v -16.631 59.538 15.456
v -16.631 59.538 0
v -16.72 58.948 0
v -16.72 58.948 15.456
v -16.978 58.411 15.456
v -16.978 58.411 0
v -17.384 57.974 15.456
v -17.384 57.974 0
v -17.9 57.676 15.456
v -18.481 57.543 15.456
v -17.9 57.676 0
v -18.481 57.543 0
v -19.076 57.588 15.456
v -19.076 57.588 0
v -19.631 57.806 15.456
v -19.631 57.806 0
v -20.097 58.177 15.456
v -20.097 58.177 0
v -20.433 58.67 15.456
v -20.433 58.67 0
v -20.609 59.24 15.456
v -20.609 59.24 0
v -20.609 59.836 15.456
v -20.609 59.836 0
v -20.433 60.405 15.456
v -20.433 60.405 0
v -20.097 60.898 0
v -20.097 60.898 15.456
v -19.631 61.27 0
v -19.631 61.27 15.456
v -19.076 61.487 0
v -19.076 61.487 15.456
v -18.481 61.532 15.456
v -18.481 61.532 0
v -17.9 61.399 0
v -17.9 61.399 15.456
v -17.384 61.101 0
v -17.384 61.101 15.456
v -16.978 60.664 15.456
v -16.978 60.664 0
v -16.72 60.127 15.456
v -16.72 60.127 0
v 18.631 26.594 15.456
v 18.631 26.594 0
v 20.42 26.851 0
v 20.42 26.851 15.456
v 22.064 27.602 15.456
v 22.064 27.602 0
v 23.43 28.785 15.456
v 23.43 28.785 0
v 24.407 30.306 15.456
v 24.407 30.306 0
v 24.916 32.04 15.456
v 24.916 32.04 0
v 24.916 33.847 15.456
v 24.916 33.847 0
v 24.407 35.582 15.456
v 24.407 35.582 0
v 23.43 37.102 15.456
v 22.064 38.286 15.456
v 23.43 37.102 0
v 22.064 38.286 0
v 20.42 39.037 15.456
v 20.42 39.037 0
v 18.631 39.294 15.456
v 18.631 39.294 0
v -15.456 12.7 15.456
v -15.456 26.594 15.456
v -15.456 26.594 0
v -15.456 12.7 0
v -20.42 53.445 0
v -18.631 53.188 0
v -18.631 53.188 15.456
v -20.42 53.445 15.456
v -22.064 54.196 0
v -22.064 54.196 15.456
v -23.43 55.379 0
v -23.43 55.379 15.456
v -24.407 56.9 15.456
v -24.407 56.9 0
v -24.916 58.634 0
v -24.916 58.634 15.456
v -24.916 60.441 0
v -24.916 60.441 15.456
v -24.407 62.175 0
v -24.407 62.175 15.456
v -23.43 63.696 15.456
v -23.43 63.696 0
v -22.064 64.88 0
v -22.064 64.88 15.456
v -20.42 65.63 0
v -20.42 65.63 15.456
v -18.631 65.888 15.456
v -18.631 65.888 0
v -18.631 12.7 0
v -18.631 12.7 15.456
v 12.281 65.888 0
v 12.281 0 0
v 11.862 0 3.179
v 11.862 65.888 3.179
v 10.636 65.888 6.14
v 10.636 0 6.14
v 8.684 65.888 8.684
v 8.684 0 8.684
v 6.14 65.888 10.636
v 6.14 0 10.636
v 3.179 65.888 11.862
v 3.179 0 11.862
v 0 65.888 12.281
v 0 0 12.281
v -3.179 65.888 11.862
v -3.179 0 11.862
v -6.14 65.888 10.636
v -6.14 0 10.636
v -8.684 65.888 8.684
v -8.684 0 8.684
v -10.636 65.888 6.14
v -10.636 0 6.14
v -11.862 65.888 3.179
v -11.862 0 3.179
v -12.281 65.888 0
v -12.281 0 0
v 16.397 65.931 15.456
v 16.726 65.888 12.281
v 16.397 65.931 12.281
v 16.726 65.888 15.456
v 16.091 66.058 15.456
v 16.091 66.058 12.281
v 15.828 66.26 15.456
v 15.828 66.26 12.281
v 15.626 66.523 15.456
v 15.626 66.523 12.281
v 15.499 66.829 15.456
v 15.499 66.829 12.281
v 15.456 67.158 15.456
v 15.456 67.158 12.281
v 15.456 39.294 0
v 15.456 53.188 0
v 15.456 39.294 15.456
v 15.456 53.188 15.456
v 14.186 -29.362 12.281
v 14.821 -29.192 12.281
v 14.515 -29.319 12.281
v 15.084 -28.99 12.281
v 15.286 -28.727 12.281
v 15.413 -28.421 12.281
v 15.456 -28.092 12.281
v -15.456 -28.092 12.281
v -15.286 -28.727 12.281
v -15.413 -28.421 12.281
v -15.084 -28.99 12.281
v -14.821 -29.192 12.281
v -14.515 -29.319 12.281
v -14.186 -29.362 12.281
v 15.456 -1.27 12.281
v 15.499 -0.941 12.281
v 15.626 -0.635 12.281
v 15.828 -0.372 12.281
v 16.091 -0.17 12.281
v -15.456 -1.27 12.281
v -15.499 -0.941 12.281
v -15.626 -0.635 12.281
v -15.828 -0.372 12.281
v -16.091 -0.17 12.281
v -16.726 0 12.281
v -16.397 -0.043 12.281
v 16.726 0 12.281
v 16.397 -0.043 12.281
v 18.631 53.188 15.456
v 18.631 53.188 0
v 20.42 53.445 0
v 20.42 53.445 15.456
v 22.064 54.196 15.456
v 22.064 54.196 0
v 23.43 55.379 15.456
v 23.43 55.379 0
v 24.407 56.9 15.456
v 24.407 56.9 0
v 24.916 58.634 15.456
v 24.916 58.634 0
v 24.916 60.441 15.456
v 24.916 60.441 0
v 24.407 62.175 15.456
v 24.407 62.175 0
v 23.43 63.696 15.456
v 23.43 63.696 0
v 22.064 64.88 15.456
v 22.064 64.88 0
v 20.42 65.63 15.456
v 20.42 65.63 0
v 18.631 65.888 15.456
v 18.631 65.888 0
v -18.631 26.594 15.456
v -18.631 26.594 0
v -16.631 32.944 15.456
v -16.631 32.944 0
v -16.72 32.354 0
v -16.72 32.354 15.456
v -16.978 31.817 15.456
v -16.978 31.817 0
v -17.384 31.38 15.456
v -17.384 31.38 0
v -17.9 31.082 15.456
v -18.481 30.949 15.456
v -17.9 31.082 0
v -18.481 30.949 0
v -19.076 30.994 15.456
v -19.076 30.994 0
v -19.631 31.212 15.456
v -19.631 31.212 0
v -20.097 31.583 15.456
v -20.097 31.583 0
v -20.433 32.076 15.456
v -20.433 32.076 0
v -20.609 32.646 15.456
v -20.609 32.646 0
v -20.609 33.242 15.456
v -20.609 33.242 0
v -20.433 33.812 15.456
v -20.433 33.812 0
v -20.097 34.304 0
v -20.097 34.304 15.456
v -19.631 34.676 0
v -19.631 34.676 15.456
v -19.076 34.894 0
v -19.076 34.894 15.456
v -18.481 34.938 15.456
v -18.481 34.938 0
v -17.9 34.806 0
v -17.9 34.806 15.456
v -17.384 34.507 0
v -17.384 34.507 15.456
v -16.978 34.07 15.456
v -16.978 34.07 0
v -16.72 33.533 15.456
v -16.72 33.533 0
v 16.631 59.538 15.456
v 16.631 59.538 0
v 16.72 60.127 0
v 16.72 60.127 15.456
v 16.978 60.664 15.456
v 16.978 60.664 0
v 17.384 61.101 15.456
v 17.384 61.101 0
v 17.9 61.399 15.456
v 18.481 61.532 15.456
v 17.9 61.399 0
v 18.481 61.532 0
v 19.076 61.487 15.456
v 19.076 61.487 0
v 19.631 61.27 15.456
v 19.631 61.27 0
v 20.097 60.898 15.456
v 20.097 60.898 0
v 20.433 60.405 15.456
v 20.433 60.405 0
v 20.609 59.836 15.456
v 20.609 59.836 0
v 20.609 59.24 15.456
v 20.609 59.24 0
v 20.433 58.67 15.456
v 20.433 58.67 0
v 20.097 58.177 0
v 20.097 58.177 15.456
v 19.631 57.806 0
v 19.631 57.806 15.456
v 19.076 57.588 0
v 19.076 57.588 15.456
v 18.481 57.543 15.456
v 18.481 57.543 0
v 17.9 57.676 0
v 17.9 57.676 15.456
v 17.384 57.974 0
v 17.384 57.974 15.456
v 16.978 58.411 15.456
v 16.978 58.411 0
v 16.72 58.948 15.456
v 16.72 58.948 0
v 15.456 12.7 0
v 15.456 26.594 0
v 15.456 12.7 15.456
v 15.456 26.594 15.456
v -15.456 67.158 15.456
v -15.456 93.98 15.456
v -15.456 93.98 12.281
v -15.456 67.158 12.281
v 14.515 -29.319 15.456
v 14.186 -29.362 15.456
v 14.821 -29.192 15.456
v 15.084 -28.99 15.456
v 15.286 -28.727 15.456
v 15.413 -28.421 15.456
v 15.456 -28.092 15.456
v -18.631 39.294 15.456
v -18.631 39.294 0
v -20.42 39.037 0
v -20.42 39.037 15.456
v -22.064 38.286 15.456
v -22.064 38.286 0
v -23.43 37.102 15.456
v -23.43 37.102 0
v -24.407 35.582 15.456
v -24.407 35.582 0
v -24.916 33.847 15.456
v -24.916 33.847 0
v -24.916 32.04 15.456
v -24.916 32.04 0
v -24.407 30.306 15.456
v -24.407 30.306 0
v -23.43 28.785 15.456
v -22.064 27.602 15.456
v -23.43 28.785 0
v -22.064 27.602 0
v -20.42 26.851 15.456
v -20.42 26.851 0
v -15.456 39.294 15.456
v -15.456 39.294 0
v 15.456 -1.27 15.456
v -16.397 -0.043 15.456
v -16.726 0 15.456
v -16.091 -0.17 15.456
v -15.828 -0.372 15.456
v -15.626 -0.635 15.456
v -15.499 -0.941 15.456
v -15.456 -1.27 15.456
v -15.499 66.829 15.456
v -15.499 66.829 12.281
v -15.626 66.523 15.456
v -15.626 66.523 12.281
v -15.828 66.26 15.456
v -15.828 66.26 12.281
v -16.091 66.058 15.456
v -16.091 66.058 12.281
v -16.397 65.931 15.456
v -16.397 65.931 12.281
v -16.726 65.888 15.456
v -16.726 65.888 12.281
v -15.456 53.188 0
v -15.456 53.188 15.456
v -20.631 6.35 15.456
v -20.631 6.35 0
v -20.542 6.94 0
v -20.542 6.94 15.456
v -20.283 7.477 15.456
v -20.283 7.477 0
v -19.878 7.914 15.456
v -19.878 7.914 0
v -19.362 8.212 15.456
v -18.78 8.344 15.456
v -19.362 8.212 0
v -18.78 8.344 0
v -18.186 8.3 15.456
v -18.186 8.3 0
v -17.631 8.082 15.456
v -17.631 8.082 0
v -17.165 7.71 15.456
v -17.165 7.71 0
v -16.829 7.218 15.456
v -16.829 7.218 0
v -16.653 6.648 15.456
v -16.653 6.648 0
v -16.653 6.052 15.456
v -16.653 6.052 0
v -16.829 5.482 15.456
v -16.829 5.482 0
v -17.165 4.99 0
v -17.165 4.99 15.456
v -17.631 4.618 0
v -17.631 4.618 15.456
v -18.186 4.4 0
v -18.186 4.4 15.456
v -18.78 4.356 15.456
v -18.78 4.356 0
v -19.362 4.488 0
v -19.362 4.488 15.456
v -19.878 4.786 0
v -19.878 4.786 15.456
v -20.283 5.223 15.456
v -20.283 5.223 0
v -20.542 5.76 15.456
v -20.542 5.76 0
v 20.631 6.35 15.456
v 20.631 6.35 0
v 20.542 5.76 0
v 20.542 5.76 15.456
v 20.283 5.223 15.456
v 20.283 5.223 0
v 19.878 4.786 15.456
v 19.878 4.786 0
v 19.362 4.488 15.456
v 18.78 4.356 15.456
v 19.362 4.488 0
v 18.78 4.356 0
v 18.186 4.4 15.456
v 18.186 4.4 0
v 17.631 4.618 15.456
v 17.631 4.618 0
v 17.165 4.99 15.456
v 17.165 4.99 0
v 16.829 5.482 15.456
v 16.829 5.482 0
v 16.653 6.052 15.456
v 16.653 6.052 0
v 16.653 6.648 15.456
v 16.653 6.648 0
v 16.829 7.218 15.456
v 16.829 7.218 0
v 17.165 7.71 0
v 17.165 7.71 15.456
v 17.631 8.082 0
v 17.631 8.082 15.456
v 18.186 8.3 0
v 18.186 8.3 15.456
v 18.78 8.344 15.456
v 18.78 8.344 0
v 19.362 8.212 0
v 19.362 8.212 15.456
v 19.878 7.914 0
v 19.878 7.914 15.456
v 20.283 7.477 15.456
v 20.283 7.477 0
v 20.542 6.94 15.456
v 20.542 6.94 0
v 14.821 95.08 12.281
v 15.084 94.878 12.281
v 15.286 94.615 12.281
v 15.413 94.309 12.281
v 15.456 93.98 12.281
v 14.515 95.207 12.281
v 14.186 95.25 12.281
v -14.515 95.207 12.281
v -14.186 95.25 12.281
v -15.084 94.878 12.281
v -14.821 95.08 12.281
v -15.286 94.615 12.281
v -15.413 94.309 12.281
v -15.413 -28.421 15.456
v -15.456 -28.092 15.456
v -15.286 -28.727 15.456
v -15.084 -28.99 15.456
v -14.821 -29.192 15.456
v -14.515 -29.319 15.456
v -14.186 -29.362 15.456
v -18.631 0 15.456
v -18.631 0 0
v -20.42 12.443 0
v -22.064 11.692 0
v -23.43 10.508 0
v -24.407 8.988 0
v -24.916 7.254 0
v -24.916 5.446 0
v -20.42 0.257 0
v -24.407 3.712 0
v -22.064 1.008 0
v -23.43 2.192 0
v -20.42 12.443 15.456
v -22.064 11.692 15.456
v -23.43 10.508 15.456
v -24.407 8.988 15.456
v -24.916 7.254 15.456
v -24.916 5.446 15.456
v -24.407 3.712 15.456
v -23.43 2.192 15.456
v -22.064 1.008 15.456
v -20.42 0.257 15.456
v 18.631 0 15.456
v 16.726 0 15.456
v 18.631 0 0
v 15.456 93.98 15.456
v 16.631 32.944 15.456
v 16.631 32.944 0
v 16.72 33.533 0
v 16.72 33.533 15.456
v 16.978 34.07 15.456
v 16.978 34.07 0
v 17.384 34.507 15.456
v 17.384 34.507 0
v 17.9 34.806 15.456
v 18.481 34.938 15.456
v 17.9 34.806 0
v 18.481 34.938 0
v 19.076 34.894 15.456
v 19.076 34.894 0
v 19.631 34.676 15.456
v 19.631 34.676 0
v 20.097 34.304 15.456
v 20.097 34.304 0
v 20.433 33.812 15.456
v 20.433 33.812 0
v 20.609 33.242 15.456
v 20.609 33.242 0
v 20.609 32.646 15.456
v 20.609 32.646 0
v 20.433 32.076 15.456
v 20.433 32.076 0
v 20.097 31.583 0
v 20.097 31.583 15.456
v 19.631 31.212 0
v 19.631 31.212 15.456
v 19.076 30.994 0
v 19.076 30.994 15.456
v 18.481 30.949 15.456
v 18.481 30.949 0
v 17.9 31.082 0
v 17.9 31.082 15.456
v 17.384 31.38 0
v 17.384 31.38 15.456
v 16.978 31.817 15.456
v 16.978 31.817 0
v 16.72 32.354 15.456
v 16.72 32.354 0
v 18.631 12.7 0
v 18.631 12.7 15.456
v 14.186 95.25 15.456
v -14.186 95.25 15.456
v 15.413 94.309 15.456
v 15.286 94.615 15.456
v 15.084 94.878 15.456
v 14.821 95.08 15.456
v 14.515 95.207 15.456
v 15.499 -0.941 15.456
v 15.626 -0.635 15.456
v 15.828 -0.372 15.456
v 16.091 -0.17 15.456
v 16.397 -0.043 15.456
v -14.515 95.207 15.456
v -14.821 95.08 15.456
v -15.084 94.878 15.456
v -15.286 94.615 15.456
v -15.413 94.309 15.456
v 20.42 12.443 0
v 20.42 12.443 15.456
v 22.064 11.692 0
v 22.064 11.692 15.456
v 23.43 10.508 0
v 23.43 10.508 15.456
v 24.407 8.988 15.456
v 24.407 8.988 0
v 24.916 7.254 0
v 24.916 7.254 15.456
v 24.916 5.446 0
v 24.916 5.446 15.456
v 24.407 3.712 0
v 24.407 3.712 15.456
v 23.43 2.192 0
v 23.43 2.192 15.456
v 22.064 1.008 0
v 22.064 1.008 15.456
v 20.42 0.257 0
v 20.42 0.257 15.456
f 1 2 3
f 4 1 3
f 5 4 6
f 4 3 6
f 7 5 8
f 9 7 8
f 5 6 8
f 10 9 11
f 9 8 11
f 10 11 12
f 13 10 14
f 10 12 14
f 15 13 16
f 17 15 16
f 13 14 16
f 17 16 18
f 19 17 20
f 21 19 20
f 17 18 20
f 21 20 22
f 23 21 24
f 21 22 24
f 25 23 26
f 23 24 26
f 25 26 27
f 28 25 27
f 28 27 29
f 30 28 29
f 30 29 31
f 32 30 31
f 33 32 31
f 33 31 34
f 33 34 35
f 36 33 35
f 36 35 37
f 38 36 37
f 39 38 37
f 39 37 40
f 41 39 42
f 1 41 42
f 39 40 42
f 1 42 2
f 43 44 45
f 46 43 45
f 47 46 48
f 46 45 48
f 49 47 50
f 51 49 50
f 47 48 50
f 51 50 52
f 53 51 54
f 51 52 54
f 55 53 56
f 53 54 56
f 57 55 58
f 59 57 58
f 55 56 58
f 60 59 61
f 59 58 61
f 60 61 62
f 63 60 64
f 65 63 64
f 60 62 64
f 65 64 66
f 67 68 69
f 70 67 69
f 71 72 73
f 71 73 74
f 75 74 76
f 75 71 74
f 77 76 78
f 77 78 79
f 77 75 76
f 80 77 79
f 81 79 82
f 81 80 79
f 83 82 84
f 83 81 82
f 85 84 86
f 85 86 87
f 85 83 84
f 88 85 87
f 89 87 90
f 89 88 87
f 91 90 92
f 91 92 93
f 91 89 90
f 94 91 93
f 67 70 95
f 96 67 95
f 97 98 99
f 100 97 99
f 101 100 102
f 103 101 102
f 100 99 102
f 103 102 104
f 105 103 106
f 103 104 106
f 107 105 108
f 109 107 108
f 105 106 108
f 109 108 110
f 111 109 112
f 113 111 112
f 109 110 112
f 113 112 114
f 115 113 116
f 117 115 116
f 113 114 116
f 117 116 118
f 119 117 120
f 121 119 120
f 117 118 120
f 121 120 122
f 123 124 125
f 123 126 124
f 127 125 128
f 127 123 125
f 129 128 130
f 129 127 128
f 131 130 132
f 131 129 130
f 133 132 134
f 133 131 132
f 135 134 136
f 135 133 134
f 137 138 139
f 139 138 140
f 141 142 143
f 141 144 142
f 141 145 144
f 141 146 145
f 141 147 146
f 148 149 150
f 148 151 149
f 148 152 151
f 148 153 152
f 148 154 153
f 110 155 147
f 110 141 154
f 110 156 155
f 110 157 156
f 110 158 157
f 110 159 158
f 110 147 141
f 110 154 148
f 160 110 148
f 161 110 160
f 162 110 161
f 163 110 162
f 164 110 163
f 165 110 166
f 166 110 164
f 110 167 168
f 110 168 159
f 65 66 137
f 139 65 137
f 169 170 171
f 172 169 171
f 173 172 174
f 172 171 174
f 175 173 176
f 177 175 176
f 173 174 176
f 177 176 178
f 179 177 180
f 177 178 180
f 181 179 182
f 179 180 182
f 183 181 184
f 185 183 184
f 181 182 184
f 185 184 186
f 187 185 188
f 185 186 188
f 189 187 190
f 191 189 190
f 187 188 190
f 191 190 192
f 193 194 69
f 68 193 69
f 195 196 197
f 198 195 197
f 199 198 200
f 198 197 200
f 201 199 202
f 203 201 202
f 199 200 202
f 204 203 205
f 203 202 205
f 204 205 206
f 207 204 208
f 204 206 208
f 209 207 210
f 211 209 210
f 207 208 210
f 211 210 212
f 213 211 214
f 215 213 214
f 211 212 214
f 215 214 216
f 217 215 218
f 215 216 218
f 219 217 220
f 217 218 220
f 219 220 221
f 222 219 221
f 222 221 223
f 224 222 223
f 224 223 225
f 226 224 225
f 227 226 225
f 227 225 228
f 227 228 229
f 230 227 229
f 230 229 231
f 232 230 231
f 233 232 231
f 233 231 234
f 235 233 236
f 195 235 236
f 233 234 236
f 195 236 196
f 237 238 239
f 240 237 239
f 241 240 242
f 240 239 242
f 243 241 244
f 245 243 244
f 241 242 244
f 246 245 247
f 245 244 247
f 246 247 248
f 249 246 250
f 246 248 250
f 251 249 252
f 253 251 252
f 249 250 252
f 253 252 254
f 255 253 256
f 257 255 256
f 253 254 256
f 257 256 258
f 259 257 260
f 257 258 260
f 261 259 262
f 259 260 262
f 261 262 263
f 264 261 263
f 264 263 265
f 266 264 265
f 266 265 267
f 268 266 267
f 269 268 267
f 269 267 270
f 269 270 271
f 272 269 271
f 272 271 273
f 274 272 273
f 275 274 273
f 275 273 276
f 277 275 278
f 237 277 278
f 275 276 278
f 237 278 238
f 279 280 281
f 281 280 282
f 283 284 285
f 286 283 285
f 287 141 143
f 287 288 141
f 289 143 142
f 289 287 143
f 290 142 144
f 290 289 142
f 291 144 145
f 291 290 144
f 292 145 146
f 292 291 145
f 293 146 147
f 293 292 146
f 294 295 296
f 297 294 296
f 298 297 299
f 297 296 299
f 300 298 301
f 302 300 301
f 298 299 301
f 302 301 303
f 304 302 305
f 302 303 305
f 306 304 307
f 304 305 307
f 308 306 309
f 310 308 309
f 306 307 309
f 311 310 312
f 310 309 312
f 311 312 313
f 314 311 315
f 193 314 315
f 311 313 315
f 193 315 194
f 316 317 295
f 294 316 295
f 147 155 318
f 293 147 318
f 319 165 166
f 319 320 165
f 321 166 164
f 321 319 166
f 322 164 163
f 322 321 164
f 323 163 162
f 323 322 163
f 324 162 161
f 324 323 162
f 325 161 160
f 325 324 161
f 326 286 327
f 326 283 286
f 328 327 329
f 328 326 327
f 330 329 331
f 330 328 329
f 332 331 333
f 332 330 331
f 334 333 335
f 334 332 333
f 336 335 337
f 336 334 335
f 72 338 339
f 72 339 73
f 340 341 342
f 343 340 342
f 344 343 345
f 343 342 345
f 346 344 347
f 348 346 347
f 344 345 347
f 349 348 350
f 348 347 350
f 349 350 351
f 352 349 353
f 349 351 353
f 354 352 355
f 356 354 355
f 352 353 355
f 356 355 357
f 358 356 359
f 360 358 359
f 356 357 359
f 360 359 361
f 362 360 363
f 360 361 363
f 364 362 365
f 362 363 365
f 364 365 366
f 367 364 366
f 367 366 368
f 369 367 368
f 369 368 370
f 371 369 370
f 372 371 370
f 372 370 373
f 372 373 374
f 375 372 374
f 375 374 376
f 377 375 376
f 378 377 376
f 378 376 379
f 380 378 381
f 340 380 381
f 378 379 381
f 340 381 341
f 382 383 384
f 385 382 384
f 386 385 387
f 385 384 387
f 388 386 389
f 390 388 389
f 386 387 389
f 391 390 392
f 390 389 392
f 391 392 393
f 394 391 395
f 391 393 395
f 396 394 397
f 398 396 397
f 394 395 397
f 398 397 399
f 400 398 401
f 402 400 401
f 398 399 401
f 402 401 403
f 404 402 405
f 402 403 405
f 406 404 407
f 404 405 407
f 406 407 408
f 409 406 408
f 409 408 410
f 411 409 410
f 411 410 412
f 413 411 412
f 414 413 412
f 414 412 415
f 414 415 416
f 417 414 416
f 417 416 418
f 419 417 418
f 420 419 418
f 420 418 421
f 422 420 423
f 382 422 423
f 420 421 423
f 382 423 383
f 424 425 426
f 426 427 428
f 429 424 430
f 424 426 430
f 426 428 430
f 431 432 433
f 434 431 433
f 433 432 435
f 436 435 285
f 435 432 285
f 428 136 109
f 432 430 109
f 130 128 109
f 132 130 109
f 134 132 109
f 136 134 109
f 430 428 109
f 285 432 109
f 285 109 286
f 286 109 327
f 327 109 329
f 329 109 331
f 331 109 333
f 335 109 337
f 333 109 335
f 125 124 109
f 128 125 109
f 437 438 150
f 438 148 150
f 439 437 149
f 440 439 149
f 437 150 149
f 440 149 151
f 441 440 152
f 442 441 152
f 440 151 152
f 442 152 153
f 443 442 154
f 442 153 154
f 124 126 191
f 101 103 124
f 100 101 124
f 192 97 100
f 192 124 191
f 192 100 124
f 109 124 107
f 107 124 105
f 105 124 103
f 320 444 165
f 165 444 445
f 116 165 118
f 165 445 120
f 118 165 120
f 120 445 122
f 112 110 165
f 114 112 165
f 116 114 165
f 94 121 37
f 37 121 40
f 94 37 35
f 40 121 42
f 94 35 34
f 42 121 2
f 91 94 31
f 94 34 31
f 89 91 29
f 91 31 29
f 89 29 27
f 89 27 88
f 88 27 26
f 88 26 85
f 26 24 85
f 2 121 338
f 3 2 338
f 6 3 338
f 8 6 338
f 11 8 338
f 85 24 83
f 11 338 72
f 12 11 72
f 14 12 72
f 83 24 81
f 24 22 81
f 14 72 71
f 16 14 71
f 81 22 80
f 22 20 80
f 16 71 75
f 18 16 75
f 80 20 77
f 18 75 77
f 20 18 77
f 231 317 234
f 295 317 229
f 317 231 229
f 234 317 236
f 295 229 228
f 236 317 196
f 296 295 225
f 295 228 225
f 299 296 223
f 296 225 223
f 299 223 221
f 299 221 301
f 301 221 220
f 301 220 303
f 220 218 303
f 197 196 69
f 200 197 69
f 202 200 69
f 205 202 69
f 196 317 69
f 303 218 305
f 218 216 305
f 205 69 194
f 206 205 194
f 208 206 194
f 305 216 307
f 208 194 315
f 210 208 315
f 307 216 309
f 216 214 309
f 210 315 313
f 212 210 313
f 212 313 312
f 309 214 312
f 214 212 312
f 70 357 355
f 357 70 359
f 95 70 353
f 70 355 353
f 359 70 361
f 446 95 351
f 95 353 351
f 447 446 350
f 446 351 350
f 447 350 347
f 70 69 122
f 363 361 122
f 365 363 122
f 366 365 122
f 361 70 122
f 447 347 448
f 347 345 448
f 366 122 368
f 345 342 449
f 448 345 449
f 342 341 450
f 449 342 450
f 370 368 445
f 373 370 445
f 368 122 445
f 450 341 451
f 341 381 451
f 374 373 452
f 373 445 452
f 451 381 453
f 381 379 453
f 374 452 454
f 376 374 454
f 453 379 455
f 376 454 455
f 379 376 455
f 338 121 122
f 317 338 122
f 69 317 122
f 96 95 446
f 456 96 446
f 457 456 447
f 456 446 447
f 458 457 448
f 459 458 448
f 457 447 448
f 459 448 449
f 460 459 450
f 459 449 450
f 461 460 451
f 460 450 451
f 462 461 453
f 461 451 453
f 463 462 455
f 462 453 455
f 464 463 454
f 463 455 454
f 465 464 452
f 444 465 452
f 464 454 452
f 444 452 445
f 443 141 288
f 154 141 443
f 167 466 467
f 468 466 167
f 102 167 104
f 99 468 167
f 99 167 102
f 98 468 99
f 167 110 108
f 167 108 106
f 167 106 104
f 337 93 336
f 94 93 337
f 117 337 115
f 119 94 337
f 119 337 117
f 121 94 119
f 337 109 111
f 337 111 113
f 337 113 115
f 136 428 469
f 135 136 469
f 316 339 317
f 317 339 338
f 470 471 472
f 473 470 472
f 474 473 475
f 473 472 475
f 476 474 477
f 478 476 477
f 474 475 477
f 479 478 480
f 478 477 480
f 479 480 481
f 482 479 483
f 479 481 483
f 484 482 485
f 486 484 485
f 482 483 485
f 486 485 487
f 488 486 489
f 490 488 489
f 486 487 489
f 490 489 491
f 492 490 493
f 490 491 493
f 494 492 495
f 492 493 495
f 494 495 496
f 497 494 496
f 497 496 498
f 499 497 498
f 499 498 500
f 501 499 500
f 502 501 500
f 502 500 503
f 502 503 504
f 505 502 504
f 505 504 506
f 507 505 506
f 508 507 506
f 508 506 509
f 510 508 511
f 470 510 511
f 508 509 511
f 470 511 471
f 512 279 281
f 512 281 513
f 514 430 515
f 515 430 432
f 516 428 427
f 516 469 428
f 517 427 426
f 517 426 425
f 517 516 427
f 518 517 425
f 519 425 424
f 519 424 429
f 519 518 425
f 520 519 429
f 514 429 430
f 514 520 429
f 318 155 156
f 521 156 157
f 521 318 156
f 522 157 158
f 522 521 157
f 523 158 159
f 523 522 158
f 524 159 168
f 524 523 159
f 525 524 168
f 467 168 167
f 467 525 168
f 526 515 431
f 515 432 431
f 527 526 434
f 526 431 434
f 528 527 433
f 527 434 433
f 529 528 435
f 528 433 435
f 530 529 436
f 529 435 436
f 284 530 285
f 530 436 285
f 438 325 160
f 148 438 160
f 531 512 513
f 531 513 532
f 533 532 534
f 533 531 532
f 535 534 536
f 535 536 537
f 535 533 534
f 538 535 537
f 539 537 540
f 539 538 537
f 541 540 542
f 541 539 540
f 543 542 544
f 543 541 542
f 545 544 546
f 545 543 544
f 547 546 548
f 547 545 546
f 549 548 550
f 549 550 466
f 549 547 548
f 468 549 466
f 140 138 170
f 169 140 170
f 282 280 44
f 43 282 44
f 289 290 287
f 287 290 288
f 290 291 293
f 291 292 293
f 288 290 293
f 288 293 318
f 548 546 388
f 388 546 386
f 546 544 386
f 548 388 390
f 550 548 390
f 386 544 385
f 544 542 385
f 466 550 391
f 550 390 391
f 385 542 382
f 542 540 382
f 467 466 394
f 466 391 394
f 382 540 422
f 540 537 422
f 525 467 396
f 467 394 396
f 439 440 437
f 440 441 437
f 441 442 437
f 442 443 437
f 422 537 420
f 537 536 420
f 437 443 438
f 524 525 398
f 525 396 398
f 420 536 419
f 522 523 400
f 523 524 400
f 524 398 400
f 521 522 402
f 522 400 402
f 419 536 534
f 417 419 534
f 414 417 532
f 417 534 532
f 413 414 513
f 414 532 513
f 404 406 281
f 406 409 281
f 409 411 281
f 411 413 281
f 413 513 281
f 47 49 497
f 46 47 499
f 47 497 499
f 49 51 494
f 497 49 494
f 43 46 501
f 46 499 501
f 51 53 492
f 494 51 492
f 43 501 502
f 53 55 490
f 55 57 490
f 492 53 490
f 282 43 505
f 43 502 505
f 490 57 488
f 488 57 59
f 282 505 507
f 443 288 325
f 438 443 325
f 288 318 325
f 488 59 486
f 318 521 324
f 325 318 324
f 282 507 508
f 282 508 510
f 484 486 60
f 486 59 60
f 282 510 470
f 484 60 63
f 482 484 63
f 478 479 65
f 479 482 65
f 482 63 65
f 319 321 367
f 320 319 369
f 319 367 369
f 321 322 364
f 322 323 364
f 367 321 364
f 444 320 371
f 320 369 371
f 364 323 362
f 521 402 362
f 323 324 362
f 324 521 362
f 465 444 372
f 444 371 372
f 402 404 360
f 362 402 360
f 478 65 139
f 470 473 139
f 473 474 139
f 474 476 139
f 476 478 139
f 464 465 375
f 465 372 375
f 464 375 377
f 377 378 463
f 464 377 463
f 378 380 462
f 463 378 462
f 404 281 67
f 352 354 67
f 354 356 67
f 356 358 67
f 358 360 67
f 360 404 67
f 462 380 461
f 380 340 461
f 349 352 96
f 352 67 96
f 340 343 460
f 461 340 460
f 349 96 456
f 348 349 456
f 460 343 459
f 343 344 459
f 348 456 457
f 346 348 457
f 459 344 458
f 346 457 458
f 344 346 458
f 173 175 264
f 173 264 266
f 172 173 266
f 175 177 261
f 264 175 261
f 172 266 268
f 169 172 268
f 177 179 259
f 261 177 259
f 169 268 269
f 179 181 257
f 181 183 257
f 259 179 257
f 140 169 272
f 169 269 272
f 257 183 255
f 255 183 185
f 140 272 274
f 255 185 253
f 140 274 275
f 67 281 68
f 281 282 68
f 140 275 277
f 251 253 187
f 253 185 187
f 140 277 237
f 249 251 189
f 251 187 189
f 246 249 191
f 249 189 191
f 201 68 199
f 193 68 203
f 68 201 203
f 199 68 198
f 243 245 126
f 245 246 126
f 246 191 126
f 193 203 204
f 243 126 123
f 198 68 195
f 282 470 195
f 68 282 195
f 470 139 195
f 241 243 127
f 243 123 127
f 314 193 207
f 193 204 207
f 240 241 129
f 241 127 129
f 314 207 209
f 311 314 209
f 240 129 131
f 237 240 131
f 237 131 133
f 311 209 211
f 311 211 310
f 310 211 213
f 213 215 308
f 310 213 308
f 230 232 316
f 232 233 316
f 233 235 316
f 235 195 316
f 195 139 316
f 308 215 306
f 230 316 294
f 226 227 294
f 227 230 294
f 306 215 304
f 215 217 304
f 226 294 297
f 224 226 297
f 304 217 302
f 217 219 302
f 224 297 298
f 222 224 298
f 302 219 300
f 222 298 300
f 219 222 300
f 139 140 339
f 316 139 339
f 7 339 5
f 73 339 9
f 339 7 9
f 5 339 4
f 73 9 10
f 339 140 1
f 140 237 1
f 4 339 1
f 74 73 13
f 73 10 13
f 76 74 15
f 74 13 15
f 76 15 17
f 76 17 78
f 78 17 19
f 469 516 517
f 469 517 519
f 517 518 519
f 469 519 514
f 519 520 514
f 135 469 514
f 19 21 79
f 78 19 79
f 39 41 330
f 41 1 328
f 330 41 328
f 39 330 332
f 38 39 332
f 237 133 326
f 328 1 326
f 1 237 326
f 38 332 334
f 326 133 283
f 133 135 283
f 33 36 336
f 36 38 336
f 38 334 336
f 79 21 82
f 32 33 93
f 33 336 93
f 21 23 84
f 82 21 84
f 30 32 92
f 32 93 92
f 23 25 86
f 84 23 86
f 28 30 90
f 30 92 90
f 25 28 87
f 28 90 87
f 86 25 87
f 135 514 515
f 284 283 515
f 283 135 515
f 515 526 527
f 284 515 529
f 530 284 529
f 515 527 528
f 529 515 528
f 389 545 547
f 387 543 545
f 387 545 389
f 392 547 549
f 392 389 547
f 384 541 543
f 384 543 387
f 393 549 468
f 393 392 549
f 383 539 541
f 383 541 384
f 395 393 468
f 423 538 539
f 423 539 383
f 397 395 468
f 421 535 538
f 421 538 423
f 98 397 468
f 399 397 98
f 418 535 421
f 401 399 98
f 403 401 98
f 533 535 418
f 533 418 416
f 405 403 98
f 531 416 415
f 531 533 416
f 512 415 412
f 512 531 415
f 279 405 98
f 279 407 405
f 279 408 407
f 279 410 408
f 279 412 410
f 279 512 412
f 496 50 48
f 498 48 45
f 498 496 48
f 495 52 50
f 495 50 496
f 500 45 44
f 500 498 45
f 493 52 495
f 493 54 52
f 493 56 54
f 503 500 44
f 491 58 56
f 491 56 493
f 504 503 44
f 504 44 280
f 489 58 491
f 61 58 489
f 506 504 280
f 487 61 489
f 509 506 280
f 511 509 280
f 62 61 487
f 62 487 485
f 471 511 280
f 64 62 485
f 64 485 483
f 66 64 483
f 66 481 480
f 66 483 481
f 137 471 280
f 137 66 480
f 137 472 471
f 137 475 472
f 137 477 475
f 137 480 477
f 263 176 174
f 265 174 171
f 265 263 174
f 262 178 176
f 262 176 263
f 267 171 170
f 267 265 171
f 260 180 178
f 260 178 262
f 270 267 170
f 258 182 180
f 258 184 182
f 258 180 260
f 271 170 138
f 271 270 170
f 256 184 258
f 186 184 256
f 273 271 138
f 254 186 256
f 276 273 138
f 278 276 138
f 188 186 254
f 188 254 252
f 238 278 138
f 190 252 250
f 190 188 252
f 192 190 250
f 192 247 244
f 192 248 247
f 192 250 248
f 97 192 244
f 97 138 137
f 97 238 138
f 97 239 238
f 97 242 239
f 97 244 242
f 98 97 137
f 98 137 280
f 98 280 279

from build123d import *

# Parameters (mm, degrees)
BOSS_EXTRUDE1_DEPTH = 65.8876
BOSS_EXTRUDE2_DEPTH = 29.3624
SKETCH4_R           = 2
BOSS_EXTRUDE3_DEPTH = 15.4559
FILLET1_R           = 1.27


with BuildPart() as part:
    # Sketch1 → Boss-Extrude1 (new body)
    with BuildSketch(Plane(origin=(0, 0, 0), x_dir=(1, 0, 0), z_dir=(0, 1, 0))):
        with BuildLine():
            Line((-12.2809, 0), (-15.4559, 0))
            Line((-15.4559, 0), (-15.4559, -15.4559))
            Line((-15.4559, -15.4559), (0, -15.4559))
            Line((0, -15.4559), (15.4559, -15.4559))
            Line((15.4559, -15.4559), (15.4559, 0))
            Line((15.4559, 0), (12.2809, 0))
            ThreePointArc((12.2809, 0), (0, -12.2809), (-12.2809, 0))
        make_face()
    extrude(amount=BOSS_EXTRUDE1_DEPTH)

    # Sketch2 → Boss-Extrude2 (add)
    with BuildSketch(Plane(origin=(0, 65.8876, 0), x_dir=(1, 0, 0), z_dir=(0, 1, 0))):
        Polygon((-12.2809, -12.2809), (0, -12.2809), (12.2809, -12.2809), (15.4559, -12.2809), (15.4559, -15.4559), (-15.4559, -15.4559), (-15.4559, -12.2809), align=None)
    boss_extrude2 = extrude(amount=BOSS_EXTRUDE2_DEPTH)

    # Mirror1: Boss-Extrude2 across plane
    add(boss_extrude2.mirror(Plane.ZX.offset(32.9438)))

    # Sketch4 → Boss-Extrude3 (add, through all)
    # profile 1 of 6: a face of its own
    with BuildSketch(Plane(origin=(0, 0, 0), x_dir=(-1, 0, 0), z_dir=(0, 0, -1))):
        with BuildLine():
            Line((-15.4559, 39.2938), (-15.4559, 26.5938))
            Line((-15.4559, 26.5938), (-18.6309, 26.5938))
            ThreePointArc((-18.6309, 26.5938), (-24.9809, 32.9438), (-18.6309, 39.2938))
            Line((-18.6309, 39.2938), (-15.4559, 39.2938))
        make_face()
        with Locations((-18.6309, 32.9438)):
            Circle(SKETCH4_R, mode=Mode.SUBTRACT)
    # profile 2 of 6: a face of its own
    with BuildSketch(Plane(origin=(0, 0, 0), x_dir=(-1, 0, 0), z_dir=(0, 0, -1))):
        with BuildLine():
            Line((-15.4559, 12.7), (-18.6309, 12.7))
            ThreePointArc((-18.6309, 12.7), (-24.9809, 6.35), (-18.6309, 0))
            Line((-18.6309, 0), (-15.4559, 0))
            Line((-15.4559, 0), (-15.4559, 12.7))
        make_face()
        with Locations(Location((-18.6309, 6.35, 0), (0, 0, 180))):
            Circle(SKETCH4_R, mode=Mode.SUBTRACT)
    # profile 3 of 6: a face of its own
    with BuildSketch(Plane(origin=(0, 0, 0), x_dir=(-1, 0, 0), z_dir=(0, 0, -1))):
        with BuildLine():
            Line((-18.6309, 65.8876), (-15.4559, 65.8876))
            Line((-15.4559, 65.8876), (-15.4559, 53.1876))
            Line((-15.4559, 53.1876), (-18.6309, 53.1876))
            ThreePointArc((-18.6309, 53.1876), (-24.9809, 59.5376), (-18.6309, 65.8876))
        make_face()
        with Locations((-18.6309, 59.5376)):
            Circle(SKETCH4_R, mode=Mode.SUBTRACT)
    # profile 4 of 6: a face of its own
    with BuildSketch(Plane(origin=(0, 0, 0), x_dir=(-1, 0, 0), z_dir=(0, 0, -1))):
        with BuildLine():
            Line((18.6309, 0), (15.4559, 0))
            Line((15.4559, 0), (15.4559, 12.7))
            Line((15.4559, 12.7), (18.6309, 12.7))
            ThreePointArc((18.6309, 12.7), (24.9809, 6.35), (18.6309, 0))
        make_face()
        with Locations((18.6309, 6.35)):
            Circle(SKETCH4_R, mode=Mode.SUBTRACT)
    # profile 5 of 6: a face of its own
    with BuildSketch(Plane(origin=(0, 0, 0), x_dir=(-1, 0, 0), z_dir=(0, 0, -1))):
        with BuildLine():
            Line((15.4559, 53.1876), (18.6309, 53.1876))
            ThreePointArc((18.6309, 53.1876), (24.9809, 59.5376), (18.6309, 65.8876))
            Line((18.6309, 65.8876), (15.4559, 65.8876))
            Line((15.4559, 65.8876), (15.4559, 53.1876))
        make_face()
        with Locations(Location((18.6309, 59.5376, 0), (0, 0, 180))):
            Circle(SKETCH4_R, mode=Mode.SUBTRACT)
    # profile 6 of 6: a face of its own
    with BuildSketch(Plane(origin=(0, 0, 0), x_dir=(-1, 0, 0), z_dir=(0, 0, -1))):
        with BuildLine():
            Line((18.6309, 26.5938), (15.4559, 26.5938))
            Line((15.4559, 26.5938), (15.4559, 39.2938))
            Line((15.4559, 39.2938), (18.6309, 39.2938))
            ThreePointArc((18.6309, 39.2938), (24.9809, 32.9438), (18.6309, 26.5938))
        make_face()
        with Locations(Location((18.6309, 32.9438, 0), (0, 0, 180))):
            Circle(SKETCH4_R, mode=Mode.SUBTRACT)
    extrude(amount=-BOSS_EXTRUDE3_DEPTH)

    # Fillet1
    fillet1_edges = [part.edges().sort_by_distance(p)[0] for p in [
        (-15.4559, 0, 13.8684),
        (-15.4559, 95.25, 13.8684),
        (15.4559, 95.25, 13.8684),
        (15.4559, -29.3624, 13.8684),
        (-15.4559, -29.3624, 13.8684),
        (15.4559, 65.8876, 13.8684),
        (15.4559, 0, 13.8684),
        (-15.4559, 65.8876, 13.8684),
    ]]
    fillet(fillet1_edges, radius=FILLET1_R)


solid = part.part
